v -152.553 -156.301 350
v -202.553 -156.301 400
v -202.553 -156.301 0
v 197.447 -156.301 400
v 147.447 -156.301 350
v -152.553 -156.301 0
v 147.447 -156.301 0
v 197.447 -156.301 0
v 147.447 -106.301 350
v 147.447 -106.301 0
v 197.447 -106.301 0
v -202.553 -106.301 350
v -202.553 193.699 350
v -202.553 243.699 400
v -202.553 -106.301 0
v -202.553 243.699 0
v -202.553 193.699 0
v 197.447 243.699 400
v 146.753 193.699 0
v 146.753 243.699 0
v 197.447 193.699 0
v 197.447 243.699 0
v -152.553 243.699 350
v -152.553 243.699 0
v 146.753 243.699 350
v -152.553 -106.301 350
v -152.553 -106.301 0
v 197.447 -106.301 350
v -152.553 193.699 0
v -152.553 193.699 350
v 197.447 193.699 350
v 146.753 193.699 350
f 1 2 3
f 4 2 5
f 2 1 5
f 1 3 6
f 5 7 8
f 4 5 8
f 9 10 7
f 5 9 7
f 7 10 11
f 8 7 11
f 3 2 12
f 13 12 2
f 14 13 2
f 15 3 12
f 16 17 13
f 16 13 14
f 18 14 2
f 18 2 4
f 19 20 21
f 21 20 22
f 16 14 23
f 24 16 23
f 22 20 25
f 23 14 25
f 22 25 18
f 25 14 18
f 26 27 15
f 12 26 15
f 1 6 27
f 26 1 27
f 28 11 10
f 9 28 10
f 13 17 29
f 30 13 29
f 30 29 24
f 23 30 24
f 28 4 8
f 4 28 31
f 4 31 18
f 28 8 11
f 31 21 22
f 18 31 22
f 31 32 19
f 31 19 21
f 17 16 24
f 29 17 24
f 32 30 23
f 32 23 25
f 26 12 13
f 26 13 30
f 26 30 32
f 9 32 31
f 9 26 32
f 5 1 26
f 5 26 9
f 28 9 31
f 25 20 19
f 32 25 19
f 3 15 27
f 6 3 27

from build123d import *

# Parameters (mm, degrees)
F0_W      = 400
F0_H      = 400
F1_DEPTH  = 350
F2_W      = 400
F2_H      = 50
F3_DEPTH  = 300
F5_DEPTH  = 50
F6_DEPTH  = 250
F7_DEPTH  = 250
F8_W      = 400
F8_H      = 96.5097817794
F9_DEPTH  = 300
F10_DEPTH = 50
F11_DEPTH = 350
F12_DEPTH = 345.44


with BuildPart() as f1:
    # F0 (on Top) → F1 (new body)
    with BuildSketch(Plane.XY):
        with Locations((-2.5529135019, 43.6986592397)):
            Rectangle(F0_W, F0_H)
    extrude(amount=F1_DEPTH)

    # F2 (on face) → F3 (join)
    with BuildSketch(Plane.XY.offset(350)):
        with Locations((-2.5529135019, 218.6986592397)):
            Rectangle(F2_W, F2_H)
    extrude(amount=F3_DEPTH)

    # F5 (add): a face of the model
    f5_faces = [f1.faces().sort_by_distance(p)[0] for p in [
        (-2.5529135019, 18.6986592397, 350),
    ]]
    extrude(f5_faces, amount=F5_DEPTH)

    # F6 (add): a face of the model
    f6_faces = [f1.faces().sort_by_distance(p)[0] for p in [
        (-2.5529135019, 218.6986592397, 650),
    ]]
    extrude(f6_faces, amount=-F6_DEPTH)

    # F7 (cut): a face of the model
    f7_faces = [f1.faces().sort_by_distance(p)[0] for p in [
        (-2.5529135019, 218.6986592397, 650),
    ]]
    extrude(f7_faces, amount=-F7_DEPTH, mode=Mode.SUBTRACT)

    # F8 (on face) → F9 (join)
    with BuildSketch(Plane.XY.offset(400)):
        with Locations((-2.5529135019, 291.9535501294)):
            Rectangle(F8_W, F8_H)
    extrude(amount=F9_DEPTH)

    # F10 (add): a face of the model
    f10_faces = [f1.faces().sort_by_distance(p)[0] for p in [
        (-2.5529135019, 243.6986592397, 550),
    ]]
    extrude(f10_faces, amount=-F10_DEPTH)

    # F4 (on face) → F11 (cut)
    with BuildSketch(Plane(origin=(0, 0, 0), x_dir=(1, 0, 0), z_dir=(0, 0, -1))):
        Polygon((147.4470864981, 156.3013407603), (-152.5529135019, 156.3013407603), (-152.5529135019, 106.3013407603), (-202.5529135019, 106.3013407603), (-202.5529135019, -193.6986592397), (-152.5529135019, -193.6986592397), (-152.5529135019, -243.6986592397), (146.7532366514, -243.6986592397), (146.7532366514, -193.6986592397), (197.4470864981, -193.6986592397), (197.4470864981, 106.3013407603), (147.4470864981, 106.3013407603), align=None)
    extrude(amount=-F11_DEPTH, mode=Mode.SUBTRACT)

    # F12 (cut): a face of the model
    f12_faces = [f1.faces().sort_by_distance(p)[0] for p in [
        (-2.5529135019, 291.9535501294, 700),
    ]]
    extrude(f12_faces, amount=-F12_DEPTH, mode=Mode.SUBTRACT)


solid = f1.part
